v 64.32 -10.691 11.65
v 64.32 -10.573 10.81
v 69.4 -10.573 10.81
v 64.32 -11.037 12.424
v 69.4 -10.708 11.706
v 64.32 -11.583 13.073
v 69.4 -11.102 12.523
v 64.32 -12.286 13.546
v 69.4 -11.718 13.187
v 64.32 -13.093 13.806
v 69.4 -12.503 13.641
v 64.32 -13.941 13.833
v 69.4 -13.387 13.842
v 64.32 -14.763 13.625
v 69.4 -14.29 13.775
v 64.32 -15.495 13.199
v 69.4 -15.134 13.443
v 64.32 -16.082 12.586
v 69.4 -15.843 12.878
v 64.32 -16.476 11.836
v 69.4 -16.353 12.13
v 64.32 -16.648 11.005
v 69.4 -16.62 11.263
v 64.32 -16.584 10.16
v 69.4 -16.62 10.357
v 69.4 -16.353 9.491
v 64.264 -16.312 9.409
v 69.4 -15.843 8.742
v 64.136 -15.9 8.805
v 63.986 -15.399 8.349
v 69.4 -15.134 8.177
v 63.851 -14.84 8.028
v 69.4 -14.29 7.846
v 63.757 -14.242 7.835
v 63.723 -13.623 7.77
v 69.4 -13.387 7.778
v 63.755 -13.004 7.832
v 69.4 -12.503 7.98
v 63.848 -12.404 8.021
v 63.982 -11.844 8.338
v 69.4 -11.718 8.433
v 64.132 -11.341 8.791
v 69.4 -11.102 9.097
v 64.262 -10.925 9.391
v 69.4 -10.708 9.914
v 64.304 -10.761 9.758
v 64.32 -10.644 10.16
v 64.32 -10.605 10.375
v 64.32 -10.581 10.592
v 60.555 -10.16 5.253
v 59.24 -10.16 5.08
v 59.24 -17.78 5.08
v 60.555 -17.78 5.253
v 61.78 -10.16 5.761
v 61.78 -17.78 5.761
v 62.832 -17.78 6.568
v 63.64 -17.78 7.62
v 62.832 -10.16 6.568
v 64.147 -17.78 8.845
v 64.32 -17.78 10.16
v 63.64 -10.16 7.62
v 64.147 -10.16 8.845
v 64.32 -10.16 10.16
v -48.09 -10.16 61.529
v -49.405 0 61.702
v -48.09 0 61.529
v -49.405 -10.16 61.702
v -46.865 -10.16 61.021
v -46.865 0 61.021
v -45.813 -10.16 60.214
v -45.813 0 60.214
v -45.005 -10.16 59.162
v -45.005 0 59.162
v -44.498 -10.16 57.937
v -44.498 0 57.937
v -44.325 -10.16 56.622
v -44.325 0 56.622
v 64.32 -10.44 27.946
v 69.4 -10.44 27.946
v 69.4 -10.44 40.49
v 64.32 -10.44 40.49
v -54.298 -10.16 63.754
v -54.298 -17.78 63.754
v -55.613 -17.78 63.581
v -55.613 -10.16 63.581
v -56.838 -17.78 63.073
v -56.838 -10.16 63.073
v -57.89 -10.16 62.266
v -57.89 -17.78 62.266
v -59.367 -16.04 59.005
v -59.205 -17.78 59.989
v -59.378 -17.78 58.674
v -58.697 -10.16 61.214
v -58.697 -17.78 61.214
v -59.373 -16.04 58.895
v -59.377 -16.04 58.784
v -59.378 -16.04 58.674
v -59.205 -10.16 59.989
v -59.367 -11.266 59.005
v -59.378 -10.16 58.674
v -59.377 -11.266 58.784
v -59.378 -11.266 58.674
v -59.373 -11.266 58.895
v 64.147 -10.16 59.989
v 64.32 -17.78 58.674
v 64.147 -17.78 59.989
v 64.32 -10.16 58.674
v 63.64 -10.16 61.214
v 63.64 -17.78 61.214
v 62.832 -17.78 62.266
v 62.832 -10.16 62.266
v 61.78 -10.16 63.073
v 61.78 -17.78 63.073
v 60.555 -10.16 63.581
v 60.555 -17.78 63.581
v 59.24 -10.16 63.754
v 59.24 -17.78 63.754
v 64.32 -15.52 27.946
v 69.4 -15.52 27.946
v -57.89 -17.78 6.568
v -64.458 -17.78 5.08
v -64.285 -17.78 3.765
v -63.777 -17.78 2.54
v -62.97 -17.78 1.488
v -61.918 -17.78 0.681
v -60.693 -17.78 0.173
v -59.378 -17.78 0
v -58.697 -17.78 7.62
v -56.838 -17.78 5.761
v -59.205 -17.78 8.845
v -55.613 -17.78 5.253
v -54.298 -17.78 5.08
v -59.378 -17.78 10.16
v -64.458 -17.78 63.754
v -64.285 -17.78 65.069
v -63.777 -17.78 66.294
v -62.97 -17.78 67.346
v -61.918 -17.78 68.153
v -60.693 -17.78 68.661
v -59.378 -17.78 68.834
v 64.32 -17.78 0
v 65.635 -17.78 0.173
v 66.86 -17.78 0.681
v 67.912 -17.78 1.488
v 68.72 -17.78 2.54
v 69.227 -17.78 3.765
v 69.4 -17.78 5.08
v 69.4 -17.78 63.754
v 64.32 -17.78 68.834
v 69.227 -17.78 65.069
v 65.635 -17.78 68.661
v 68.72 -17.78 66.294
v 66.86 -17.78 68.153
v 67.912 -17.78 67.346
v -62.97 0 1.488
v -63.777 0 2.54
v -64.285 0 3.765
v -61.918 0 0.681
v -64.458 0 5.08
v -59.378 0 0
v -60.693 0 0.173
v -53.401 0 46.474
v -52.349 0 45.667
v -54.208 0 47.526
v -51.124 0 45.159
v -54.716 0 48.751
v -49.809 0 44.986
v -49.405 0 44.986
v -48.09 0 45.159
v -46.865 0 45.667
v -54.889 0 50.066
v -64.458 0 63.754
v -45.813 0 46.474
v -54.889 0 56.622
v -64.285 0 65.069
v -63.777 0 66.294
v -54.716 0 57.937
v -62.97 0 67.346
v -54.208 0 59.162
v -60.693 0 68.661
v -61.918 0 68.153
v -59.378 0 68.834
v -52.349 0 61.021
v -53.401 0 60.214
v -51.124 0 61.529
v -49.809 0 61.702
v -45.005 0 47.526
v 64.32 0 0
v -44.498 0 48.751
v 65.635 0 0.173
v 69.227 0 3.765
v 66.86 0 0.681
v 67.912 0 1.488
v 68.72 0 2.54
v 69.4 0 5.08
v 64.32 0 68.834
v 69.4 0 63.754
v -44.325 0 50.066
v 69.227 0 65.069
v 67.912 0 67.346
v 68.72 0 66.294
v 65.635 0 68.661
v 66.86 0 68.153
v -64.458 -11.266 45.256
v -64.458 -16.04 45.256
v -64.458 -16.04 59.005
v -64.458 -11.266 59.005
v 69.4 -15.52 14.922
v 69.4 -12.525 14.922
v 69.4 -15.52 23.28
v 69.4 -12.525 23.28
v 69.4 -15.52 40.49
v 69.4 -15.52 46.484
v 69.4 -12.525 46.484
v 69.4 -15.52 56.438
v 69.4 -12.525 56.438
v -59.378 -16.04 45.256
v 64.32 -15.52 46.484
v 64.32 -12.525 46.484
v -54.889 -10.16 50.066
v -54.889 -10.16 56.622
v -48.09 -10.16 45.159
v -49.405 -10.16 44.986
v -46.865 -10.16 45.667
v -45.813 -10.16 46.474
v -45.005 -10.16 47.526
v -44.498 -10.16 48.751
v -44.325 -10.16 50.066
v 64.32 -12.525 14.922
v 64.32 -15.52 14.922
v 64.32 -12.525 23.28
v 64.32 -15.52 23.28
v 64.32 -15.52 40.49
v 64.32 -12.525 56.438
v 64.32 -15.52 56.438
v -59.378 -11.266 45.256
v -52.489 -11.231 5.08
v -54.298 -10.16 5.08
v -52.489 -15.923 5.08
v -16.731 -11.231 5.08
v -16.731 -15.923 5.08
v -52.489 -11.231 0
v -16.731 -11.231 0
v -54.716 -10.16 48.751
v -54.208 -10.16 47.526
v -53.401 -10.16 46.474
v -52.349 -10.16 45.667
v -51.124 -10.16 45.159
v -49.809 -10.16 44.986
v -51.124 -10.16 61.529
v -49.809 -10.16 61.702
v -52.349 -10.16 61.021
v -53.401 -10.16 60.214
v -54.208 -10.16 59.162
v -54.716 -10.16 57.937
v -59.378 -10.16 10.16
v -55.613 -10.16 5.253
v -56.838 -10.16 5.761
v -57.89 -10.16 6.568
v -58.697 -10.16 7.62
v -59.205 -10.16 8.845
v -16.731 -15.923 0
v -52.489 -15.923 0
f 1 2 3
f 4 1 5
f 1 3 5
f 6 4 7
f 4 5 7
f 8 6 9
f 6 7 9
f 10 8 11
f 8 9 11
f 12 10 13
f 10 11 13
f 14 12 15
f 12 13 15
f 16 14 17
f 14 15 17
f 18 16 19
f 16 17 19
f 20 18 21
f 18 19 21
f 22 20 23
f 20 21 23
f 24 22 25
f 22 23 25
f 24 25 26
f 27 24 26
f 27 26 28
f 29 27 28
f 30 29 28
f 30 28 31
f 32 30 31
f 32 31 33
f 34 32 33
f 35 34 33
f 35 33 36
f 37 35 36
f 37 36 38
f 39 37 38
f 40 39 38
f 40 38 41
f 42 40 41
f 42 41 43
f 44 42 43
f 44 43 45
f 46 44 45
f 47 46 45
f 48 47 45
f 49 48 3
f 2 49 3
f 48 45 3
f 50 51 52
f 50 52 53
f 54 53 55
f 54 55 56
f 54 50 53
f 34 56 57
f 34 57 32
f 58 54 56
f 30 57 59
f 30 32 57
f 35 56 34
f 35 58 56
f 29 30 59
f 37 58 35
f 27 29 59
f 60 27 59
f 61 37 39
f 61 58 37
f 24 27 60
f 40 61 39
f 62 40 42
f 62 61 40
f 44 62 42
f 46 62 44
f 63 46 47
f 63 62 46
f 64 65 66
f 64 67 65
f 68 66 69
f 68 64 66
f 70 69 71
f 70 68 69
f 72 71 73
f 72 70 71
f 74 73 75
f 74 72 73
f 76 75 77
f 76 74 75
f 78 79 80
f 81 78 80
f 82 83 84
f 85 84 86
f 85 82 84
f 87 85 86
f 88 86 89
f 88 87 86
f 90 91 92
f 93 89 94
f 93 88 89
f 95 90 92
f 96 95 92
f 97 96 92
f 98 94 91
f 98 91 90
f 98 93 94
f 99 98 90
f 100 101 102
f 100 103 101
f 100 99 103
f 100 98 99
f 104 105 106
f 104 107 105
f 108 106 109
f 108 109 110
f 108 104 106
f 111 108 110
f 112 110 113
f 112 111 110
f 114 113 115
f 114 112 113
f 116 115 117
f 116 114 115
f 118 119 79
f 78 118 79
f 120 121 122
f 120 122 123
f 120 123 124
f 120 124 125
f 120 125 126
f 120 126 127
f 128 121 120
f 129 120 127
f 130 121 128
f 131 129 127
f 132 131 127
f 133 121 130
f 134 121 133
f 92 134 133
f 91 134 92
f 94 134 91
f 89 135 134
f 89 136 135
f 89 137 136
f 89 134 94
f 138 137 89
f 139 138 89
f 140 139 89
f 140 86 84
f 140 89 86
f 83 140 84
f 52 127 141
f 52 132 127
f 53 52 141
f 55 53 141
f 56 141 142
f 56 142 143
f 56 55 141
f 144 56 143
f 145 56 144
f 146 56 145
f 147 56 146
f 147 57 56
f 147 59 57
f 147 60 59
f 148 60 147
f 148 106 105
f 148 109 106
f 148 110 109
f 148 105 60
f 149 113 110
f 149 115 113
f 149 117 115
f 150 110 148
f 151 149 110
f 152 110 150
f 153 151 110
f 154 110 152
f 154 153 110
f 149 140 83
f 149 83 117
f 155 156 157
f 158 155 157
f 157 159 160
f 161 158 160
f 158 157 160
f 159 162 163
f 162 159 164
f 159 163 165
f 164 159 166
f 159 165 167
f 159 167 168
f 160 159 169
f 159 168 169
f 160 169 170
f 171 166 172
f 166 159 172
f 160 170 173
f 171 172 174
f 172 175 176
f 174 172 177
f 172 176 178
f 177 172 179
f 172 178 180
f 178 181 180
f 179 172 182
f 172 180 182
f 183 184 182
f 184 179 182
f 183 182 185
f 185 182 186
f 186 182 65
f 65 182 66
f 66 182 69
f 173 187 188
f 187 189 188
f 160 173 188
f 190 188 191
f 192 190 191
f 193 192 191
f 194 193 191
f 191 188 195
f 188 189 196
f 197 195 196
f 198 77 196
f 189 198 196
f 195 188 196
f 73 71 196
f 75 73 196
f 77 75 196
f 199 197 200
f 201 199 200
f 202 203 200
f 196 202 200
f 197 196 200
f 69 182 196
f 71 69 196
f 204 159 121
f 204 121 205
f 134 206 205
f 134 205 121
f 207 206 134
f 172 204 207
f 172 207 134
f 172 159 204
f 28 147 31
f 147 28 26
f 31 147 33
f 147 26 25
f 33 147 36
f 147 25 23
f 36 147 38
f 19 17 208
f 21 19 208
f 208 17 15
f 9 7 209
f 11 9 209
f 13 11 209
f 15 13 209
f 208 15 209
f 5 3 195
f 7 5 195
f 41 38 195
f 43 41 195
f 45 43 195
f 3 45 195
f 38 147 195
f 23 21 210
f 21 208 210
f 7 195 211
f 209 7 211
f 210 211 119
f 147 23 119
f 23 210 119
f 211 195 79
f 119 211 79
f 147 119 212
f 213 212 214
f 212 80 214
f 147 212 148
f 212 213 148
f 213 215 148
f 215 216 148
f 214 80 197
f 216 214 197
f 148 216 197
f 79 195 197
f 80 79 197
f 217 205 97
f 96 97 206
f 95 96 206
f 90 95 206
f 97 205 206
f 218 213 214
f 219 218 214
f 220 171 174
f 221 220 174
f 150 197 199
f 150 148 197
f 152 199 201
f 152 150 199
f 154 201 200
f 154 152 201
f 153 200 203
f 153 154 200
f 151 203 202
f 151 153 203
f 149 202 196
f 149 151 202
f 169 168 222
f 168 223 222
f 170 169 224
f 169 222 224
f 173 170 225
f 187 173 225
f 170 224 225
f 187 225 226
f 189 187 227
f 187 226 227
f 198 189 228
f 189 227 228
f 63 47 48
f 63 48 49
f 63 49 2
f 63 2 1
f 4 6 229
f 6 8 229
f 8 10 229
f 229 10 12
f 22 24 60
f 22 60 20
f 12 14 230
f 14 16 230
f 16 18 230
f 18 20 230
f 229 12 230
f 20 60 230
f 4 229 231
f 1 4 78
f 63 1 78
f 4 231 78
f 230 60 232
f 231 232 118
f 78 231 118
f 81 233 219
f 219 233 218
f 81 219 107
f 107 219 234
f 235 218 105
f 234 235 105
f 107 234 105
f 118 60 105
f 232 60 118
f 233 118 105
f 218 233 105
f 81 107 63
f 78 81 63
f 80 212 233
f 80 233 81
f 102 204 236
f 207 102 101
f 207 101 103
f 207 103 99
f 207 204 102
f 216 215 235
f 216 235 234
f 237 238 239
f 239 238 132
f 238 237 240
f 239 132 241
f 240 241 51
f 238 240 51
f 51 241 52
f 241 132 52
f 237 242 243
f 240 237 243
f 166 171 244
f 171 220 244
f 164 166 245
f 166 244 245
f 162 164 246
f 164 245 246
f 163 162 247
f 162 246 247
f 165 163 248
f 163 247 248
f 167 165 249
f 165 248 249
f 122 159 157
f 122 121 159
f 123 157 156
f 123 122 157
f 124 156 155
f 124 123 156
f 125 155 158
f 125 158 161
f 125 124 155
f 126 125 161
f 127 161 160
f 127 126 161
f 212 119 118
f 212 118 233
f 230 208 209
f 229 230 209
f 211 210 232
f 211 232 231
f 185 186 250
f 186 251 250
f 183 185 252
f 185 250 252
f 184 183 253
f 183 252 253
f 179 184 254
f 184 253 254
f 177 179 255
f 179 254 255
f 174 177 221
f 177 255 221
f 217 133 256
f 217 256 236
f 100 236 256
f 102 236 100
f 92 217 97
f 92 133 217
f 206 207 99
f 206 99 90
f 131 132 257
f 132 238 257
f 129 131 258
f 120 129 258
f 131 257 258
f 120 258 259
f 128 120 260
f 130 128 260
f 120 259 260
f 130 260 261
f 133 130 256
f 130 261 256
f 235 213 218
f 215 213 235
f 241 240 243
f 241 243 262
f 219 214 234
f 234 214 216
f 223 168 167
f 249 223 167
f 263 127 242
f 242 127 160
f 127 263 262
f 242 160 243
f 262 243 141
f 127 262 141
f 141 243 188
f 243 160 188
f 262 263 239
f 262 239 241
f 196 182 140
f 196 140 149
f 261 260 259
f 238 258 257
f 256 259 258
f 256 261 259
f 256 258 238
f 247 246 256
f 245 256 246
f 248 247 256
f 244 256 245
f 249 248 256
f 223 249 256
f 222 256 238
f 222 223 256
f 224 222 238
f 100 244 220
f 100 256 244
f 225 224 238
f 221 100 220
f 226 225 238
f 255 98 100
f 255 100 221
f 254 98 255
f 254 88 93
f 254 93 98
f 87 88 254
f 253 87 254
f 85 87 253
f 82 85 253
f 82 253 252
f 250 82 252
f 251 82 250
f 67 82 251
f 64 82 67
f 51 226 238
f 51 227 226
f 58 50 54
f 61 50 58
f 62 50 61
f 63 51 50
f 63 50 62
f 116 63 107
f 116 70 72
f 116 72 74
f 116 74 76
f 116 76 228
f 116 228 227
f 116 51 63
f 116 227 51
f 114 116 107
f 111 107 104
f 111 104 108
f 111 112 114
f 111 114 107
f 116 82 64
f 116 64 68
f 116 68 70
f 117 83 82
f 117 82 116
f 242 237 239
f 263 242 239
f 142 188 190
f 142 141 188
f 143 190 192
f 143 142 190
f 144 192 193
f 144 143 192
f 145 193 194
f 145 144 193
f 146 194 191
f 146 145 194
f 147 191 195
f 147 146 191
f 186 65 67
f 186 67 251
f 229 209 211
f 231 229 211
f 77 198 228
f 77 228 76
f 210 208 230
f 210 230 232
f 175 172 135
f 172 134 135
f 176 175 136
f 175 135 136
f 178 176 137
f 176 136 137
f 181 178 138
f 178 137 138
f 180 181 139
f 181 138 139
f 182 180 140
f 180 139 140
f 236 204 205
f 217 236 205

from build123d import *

# Parameters (mm, degrees)
F0_W      = 133.858
F0_H      = 68.834
F1_DEPTH  = 17.78
F2_R      = 5.08
F3_W      = 123.698
F3_H      = 58.674
F4_DEPTH  = 7.62
F5_R      = 5.08
F6_R      = 3.040543
F6_W      = 2.994919
F6_H      = 8.357951
F6_W_2    = 5.08
F6_H_2    = 12.543548
F6_H_3    = 9.953398
F7_DEPTH  = 25.4
F8_W      = 35.758026
F8_H      = 4.692151
F9_DEPTH  = 25.4
F10_W     = 4.773868
F10_H     = 13.748736
F11_DEPTH = 25.4
F12_W     = 10.564138
F12_H     = 16.715713
F13_DEPTH = 25.4
F14_R     = 5.08


with BuildPart() as f1:
    # F0 (on Front) → F1 (new body)
    with BuildSketch(Plane.XZ):
        with Locations((2.471195, 34.417)):
            Rectangle(F0_W, F0_H)
    extrude(amount=F1_DEPTH)

    # F2
    f2_edges = [f1.edges().sort_by_distance(p)[0] for p in [
        (-64.457805, -8.89, 68.834),
        (69.400195, -8.89, 68.834),
        (69.400195, -8.89, 0),
        (-64.457805, -8.89, 0),
    ]]
    fillet(f2_edges, radius=F2_R)

    # F3 (on face) → F4 (cut)
    with BuildSketch(Plane.XZ.offset(17.78)):
        with Locations((2.471195, 34.417)):
            Rectangle(F3_W, F3_H)
    extrude(amount=-F4_DEPTH, mode=Mode.SUBTRACT)

    # F5
    f5_edges = [f1.edges().sort_by_distance(p)[0] for p in [
        (-59.377805, -13.97, 63.754),
        (-59.377805, -13.97, 5.08),
        (64.320195, -13.97, 63.754),
        (64.320195, -13.97, 5.08),
    ]]
    fillet(f5_edges, radius=F5_R)

    # F6 (on face) → F7 (cut)
    with BuildSketch(Plane.YZ.offset(69.400195)):
        with Locations((-13.613829, 10.810261)):
            Circle(F6_R)
        with Locations((-14.022106, 19.101335)):
            Rectangle(F6_W, F6_H)
        with Locations((-12.979566, 34.218168)):
            Rectangle(F6_W_2, F6_H_2)
        with Locations((-14.022106, 51.461173)):
            Rectangle(F6_W, F6_H_3)
    extrude(amount=-F7_DEPTH, mode=Mode.SUBTRACT)

    # F8 (on face) → F9 (cut)
    with BuildSketch(Plane(origin=(0, 0, 0), x_dir=(1, 0, 0), z_dir=(0, 0, -1))):
        with Locations((-34.609821, 13.577307)):
            Rectangle(F8_W, F8_H)
    extrude(amount=-F9_DEPTH, mode=Mode.SUBTRACT)

    # F10 (on face) → F11 (cut)
    with BuildSketch(Plane(origin=(-64.457805, 0, 0), x_dir=(0, -1, 0), z_dir=(-1, 0, 0))):
        with Locations((13.653257, 52.130621)):
            Rectangle(F10_W, F10_H)
    extrude(amount=-F11_DEPTH, mode=Mode.SUBTRACT)

    # F12 (on face) → F13 (cut)
    with BuildSketch(Plane(origin=(0, 0, 0), x_dir=(-1, 0, 0), z_dir=(0, 1, 0))):
        with Locations((49.606802, 53.344105)):
            Rectangle(F12_W, F12_H)
    extrude(amount=-F13_DEPTH, mode=Mode.SUBTRACT)

    # F14
    f14_edges = [f1.edges().sort_by_distance(p)[0] for p in [
        (-54.888871, -5.08, 61.701961),
        (-54.888871, -5.08, 44.986248),
        (-44.324733, -5.08, 44.986248),
        (-44.324733, -5.08, 61.701961),
    ]]
    fillet(f14_edges, radius=F14_R)


solid = f1.part
